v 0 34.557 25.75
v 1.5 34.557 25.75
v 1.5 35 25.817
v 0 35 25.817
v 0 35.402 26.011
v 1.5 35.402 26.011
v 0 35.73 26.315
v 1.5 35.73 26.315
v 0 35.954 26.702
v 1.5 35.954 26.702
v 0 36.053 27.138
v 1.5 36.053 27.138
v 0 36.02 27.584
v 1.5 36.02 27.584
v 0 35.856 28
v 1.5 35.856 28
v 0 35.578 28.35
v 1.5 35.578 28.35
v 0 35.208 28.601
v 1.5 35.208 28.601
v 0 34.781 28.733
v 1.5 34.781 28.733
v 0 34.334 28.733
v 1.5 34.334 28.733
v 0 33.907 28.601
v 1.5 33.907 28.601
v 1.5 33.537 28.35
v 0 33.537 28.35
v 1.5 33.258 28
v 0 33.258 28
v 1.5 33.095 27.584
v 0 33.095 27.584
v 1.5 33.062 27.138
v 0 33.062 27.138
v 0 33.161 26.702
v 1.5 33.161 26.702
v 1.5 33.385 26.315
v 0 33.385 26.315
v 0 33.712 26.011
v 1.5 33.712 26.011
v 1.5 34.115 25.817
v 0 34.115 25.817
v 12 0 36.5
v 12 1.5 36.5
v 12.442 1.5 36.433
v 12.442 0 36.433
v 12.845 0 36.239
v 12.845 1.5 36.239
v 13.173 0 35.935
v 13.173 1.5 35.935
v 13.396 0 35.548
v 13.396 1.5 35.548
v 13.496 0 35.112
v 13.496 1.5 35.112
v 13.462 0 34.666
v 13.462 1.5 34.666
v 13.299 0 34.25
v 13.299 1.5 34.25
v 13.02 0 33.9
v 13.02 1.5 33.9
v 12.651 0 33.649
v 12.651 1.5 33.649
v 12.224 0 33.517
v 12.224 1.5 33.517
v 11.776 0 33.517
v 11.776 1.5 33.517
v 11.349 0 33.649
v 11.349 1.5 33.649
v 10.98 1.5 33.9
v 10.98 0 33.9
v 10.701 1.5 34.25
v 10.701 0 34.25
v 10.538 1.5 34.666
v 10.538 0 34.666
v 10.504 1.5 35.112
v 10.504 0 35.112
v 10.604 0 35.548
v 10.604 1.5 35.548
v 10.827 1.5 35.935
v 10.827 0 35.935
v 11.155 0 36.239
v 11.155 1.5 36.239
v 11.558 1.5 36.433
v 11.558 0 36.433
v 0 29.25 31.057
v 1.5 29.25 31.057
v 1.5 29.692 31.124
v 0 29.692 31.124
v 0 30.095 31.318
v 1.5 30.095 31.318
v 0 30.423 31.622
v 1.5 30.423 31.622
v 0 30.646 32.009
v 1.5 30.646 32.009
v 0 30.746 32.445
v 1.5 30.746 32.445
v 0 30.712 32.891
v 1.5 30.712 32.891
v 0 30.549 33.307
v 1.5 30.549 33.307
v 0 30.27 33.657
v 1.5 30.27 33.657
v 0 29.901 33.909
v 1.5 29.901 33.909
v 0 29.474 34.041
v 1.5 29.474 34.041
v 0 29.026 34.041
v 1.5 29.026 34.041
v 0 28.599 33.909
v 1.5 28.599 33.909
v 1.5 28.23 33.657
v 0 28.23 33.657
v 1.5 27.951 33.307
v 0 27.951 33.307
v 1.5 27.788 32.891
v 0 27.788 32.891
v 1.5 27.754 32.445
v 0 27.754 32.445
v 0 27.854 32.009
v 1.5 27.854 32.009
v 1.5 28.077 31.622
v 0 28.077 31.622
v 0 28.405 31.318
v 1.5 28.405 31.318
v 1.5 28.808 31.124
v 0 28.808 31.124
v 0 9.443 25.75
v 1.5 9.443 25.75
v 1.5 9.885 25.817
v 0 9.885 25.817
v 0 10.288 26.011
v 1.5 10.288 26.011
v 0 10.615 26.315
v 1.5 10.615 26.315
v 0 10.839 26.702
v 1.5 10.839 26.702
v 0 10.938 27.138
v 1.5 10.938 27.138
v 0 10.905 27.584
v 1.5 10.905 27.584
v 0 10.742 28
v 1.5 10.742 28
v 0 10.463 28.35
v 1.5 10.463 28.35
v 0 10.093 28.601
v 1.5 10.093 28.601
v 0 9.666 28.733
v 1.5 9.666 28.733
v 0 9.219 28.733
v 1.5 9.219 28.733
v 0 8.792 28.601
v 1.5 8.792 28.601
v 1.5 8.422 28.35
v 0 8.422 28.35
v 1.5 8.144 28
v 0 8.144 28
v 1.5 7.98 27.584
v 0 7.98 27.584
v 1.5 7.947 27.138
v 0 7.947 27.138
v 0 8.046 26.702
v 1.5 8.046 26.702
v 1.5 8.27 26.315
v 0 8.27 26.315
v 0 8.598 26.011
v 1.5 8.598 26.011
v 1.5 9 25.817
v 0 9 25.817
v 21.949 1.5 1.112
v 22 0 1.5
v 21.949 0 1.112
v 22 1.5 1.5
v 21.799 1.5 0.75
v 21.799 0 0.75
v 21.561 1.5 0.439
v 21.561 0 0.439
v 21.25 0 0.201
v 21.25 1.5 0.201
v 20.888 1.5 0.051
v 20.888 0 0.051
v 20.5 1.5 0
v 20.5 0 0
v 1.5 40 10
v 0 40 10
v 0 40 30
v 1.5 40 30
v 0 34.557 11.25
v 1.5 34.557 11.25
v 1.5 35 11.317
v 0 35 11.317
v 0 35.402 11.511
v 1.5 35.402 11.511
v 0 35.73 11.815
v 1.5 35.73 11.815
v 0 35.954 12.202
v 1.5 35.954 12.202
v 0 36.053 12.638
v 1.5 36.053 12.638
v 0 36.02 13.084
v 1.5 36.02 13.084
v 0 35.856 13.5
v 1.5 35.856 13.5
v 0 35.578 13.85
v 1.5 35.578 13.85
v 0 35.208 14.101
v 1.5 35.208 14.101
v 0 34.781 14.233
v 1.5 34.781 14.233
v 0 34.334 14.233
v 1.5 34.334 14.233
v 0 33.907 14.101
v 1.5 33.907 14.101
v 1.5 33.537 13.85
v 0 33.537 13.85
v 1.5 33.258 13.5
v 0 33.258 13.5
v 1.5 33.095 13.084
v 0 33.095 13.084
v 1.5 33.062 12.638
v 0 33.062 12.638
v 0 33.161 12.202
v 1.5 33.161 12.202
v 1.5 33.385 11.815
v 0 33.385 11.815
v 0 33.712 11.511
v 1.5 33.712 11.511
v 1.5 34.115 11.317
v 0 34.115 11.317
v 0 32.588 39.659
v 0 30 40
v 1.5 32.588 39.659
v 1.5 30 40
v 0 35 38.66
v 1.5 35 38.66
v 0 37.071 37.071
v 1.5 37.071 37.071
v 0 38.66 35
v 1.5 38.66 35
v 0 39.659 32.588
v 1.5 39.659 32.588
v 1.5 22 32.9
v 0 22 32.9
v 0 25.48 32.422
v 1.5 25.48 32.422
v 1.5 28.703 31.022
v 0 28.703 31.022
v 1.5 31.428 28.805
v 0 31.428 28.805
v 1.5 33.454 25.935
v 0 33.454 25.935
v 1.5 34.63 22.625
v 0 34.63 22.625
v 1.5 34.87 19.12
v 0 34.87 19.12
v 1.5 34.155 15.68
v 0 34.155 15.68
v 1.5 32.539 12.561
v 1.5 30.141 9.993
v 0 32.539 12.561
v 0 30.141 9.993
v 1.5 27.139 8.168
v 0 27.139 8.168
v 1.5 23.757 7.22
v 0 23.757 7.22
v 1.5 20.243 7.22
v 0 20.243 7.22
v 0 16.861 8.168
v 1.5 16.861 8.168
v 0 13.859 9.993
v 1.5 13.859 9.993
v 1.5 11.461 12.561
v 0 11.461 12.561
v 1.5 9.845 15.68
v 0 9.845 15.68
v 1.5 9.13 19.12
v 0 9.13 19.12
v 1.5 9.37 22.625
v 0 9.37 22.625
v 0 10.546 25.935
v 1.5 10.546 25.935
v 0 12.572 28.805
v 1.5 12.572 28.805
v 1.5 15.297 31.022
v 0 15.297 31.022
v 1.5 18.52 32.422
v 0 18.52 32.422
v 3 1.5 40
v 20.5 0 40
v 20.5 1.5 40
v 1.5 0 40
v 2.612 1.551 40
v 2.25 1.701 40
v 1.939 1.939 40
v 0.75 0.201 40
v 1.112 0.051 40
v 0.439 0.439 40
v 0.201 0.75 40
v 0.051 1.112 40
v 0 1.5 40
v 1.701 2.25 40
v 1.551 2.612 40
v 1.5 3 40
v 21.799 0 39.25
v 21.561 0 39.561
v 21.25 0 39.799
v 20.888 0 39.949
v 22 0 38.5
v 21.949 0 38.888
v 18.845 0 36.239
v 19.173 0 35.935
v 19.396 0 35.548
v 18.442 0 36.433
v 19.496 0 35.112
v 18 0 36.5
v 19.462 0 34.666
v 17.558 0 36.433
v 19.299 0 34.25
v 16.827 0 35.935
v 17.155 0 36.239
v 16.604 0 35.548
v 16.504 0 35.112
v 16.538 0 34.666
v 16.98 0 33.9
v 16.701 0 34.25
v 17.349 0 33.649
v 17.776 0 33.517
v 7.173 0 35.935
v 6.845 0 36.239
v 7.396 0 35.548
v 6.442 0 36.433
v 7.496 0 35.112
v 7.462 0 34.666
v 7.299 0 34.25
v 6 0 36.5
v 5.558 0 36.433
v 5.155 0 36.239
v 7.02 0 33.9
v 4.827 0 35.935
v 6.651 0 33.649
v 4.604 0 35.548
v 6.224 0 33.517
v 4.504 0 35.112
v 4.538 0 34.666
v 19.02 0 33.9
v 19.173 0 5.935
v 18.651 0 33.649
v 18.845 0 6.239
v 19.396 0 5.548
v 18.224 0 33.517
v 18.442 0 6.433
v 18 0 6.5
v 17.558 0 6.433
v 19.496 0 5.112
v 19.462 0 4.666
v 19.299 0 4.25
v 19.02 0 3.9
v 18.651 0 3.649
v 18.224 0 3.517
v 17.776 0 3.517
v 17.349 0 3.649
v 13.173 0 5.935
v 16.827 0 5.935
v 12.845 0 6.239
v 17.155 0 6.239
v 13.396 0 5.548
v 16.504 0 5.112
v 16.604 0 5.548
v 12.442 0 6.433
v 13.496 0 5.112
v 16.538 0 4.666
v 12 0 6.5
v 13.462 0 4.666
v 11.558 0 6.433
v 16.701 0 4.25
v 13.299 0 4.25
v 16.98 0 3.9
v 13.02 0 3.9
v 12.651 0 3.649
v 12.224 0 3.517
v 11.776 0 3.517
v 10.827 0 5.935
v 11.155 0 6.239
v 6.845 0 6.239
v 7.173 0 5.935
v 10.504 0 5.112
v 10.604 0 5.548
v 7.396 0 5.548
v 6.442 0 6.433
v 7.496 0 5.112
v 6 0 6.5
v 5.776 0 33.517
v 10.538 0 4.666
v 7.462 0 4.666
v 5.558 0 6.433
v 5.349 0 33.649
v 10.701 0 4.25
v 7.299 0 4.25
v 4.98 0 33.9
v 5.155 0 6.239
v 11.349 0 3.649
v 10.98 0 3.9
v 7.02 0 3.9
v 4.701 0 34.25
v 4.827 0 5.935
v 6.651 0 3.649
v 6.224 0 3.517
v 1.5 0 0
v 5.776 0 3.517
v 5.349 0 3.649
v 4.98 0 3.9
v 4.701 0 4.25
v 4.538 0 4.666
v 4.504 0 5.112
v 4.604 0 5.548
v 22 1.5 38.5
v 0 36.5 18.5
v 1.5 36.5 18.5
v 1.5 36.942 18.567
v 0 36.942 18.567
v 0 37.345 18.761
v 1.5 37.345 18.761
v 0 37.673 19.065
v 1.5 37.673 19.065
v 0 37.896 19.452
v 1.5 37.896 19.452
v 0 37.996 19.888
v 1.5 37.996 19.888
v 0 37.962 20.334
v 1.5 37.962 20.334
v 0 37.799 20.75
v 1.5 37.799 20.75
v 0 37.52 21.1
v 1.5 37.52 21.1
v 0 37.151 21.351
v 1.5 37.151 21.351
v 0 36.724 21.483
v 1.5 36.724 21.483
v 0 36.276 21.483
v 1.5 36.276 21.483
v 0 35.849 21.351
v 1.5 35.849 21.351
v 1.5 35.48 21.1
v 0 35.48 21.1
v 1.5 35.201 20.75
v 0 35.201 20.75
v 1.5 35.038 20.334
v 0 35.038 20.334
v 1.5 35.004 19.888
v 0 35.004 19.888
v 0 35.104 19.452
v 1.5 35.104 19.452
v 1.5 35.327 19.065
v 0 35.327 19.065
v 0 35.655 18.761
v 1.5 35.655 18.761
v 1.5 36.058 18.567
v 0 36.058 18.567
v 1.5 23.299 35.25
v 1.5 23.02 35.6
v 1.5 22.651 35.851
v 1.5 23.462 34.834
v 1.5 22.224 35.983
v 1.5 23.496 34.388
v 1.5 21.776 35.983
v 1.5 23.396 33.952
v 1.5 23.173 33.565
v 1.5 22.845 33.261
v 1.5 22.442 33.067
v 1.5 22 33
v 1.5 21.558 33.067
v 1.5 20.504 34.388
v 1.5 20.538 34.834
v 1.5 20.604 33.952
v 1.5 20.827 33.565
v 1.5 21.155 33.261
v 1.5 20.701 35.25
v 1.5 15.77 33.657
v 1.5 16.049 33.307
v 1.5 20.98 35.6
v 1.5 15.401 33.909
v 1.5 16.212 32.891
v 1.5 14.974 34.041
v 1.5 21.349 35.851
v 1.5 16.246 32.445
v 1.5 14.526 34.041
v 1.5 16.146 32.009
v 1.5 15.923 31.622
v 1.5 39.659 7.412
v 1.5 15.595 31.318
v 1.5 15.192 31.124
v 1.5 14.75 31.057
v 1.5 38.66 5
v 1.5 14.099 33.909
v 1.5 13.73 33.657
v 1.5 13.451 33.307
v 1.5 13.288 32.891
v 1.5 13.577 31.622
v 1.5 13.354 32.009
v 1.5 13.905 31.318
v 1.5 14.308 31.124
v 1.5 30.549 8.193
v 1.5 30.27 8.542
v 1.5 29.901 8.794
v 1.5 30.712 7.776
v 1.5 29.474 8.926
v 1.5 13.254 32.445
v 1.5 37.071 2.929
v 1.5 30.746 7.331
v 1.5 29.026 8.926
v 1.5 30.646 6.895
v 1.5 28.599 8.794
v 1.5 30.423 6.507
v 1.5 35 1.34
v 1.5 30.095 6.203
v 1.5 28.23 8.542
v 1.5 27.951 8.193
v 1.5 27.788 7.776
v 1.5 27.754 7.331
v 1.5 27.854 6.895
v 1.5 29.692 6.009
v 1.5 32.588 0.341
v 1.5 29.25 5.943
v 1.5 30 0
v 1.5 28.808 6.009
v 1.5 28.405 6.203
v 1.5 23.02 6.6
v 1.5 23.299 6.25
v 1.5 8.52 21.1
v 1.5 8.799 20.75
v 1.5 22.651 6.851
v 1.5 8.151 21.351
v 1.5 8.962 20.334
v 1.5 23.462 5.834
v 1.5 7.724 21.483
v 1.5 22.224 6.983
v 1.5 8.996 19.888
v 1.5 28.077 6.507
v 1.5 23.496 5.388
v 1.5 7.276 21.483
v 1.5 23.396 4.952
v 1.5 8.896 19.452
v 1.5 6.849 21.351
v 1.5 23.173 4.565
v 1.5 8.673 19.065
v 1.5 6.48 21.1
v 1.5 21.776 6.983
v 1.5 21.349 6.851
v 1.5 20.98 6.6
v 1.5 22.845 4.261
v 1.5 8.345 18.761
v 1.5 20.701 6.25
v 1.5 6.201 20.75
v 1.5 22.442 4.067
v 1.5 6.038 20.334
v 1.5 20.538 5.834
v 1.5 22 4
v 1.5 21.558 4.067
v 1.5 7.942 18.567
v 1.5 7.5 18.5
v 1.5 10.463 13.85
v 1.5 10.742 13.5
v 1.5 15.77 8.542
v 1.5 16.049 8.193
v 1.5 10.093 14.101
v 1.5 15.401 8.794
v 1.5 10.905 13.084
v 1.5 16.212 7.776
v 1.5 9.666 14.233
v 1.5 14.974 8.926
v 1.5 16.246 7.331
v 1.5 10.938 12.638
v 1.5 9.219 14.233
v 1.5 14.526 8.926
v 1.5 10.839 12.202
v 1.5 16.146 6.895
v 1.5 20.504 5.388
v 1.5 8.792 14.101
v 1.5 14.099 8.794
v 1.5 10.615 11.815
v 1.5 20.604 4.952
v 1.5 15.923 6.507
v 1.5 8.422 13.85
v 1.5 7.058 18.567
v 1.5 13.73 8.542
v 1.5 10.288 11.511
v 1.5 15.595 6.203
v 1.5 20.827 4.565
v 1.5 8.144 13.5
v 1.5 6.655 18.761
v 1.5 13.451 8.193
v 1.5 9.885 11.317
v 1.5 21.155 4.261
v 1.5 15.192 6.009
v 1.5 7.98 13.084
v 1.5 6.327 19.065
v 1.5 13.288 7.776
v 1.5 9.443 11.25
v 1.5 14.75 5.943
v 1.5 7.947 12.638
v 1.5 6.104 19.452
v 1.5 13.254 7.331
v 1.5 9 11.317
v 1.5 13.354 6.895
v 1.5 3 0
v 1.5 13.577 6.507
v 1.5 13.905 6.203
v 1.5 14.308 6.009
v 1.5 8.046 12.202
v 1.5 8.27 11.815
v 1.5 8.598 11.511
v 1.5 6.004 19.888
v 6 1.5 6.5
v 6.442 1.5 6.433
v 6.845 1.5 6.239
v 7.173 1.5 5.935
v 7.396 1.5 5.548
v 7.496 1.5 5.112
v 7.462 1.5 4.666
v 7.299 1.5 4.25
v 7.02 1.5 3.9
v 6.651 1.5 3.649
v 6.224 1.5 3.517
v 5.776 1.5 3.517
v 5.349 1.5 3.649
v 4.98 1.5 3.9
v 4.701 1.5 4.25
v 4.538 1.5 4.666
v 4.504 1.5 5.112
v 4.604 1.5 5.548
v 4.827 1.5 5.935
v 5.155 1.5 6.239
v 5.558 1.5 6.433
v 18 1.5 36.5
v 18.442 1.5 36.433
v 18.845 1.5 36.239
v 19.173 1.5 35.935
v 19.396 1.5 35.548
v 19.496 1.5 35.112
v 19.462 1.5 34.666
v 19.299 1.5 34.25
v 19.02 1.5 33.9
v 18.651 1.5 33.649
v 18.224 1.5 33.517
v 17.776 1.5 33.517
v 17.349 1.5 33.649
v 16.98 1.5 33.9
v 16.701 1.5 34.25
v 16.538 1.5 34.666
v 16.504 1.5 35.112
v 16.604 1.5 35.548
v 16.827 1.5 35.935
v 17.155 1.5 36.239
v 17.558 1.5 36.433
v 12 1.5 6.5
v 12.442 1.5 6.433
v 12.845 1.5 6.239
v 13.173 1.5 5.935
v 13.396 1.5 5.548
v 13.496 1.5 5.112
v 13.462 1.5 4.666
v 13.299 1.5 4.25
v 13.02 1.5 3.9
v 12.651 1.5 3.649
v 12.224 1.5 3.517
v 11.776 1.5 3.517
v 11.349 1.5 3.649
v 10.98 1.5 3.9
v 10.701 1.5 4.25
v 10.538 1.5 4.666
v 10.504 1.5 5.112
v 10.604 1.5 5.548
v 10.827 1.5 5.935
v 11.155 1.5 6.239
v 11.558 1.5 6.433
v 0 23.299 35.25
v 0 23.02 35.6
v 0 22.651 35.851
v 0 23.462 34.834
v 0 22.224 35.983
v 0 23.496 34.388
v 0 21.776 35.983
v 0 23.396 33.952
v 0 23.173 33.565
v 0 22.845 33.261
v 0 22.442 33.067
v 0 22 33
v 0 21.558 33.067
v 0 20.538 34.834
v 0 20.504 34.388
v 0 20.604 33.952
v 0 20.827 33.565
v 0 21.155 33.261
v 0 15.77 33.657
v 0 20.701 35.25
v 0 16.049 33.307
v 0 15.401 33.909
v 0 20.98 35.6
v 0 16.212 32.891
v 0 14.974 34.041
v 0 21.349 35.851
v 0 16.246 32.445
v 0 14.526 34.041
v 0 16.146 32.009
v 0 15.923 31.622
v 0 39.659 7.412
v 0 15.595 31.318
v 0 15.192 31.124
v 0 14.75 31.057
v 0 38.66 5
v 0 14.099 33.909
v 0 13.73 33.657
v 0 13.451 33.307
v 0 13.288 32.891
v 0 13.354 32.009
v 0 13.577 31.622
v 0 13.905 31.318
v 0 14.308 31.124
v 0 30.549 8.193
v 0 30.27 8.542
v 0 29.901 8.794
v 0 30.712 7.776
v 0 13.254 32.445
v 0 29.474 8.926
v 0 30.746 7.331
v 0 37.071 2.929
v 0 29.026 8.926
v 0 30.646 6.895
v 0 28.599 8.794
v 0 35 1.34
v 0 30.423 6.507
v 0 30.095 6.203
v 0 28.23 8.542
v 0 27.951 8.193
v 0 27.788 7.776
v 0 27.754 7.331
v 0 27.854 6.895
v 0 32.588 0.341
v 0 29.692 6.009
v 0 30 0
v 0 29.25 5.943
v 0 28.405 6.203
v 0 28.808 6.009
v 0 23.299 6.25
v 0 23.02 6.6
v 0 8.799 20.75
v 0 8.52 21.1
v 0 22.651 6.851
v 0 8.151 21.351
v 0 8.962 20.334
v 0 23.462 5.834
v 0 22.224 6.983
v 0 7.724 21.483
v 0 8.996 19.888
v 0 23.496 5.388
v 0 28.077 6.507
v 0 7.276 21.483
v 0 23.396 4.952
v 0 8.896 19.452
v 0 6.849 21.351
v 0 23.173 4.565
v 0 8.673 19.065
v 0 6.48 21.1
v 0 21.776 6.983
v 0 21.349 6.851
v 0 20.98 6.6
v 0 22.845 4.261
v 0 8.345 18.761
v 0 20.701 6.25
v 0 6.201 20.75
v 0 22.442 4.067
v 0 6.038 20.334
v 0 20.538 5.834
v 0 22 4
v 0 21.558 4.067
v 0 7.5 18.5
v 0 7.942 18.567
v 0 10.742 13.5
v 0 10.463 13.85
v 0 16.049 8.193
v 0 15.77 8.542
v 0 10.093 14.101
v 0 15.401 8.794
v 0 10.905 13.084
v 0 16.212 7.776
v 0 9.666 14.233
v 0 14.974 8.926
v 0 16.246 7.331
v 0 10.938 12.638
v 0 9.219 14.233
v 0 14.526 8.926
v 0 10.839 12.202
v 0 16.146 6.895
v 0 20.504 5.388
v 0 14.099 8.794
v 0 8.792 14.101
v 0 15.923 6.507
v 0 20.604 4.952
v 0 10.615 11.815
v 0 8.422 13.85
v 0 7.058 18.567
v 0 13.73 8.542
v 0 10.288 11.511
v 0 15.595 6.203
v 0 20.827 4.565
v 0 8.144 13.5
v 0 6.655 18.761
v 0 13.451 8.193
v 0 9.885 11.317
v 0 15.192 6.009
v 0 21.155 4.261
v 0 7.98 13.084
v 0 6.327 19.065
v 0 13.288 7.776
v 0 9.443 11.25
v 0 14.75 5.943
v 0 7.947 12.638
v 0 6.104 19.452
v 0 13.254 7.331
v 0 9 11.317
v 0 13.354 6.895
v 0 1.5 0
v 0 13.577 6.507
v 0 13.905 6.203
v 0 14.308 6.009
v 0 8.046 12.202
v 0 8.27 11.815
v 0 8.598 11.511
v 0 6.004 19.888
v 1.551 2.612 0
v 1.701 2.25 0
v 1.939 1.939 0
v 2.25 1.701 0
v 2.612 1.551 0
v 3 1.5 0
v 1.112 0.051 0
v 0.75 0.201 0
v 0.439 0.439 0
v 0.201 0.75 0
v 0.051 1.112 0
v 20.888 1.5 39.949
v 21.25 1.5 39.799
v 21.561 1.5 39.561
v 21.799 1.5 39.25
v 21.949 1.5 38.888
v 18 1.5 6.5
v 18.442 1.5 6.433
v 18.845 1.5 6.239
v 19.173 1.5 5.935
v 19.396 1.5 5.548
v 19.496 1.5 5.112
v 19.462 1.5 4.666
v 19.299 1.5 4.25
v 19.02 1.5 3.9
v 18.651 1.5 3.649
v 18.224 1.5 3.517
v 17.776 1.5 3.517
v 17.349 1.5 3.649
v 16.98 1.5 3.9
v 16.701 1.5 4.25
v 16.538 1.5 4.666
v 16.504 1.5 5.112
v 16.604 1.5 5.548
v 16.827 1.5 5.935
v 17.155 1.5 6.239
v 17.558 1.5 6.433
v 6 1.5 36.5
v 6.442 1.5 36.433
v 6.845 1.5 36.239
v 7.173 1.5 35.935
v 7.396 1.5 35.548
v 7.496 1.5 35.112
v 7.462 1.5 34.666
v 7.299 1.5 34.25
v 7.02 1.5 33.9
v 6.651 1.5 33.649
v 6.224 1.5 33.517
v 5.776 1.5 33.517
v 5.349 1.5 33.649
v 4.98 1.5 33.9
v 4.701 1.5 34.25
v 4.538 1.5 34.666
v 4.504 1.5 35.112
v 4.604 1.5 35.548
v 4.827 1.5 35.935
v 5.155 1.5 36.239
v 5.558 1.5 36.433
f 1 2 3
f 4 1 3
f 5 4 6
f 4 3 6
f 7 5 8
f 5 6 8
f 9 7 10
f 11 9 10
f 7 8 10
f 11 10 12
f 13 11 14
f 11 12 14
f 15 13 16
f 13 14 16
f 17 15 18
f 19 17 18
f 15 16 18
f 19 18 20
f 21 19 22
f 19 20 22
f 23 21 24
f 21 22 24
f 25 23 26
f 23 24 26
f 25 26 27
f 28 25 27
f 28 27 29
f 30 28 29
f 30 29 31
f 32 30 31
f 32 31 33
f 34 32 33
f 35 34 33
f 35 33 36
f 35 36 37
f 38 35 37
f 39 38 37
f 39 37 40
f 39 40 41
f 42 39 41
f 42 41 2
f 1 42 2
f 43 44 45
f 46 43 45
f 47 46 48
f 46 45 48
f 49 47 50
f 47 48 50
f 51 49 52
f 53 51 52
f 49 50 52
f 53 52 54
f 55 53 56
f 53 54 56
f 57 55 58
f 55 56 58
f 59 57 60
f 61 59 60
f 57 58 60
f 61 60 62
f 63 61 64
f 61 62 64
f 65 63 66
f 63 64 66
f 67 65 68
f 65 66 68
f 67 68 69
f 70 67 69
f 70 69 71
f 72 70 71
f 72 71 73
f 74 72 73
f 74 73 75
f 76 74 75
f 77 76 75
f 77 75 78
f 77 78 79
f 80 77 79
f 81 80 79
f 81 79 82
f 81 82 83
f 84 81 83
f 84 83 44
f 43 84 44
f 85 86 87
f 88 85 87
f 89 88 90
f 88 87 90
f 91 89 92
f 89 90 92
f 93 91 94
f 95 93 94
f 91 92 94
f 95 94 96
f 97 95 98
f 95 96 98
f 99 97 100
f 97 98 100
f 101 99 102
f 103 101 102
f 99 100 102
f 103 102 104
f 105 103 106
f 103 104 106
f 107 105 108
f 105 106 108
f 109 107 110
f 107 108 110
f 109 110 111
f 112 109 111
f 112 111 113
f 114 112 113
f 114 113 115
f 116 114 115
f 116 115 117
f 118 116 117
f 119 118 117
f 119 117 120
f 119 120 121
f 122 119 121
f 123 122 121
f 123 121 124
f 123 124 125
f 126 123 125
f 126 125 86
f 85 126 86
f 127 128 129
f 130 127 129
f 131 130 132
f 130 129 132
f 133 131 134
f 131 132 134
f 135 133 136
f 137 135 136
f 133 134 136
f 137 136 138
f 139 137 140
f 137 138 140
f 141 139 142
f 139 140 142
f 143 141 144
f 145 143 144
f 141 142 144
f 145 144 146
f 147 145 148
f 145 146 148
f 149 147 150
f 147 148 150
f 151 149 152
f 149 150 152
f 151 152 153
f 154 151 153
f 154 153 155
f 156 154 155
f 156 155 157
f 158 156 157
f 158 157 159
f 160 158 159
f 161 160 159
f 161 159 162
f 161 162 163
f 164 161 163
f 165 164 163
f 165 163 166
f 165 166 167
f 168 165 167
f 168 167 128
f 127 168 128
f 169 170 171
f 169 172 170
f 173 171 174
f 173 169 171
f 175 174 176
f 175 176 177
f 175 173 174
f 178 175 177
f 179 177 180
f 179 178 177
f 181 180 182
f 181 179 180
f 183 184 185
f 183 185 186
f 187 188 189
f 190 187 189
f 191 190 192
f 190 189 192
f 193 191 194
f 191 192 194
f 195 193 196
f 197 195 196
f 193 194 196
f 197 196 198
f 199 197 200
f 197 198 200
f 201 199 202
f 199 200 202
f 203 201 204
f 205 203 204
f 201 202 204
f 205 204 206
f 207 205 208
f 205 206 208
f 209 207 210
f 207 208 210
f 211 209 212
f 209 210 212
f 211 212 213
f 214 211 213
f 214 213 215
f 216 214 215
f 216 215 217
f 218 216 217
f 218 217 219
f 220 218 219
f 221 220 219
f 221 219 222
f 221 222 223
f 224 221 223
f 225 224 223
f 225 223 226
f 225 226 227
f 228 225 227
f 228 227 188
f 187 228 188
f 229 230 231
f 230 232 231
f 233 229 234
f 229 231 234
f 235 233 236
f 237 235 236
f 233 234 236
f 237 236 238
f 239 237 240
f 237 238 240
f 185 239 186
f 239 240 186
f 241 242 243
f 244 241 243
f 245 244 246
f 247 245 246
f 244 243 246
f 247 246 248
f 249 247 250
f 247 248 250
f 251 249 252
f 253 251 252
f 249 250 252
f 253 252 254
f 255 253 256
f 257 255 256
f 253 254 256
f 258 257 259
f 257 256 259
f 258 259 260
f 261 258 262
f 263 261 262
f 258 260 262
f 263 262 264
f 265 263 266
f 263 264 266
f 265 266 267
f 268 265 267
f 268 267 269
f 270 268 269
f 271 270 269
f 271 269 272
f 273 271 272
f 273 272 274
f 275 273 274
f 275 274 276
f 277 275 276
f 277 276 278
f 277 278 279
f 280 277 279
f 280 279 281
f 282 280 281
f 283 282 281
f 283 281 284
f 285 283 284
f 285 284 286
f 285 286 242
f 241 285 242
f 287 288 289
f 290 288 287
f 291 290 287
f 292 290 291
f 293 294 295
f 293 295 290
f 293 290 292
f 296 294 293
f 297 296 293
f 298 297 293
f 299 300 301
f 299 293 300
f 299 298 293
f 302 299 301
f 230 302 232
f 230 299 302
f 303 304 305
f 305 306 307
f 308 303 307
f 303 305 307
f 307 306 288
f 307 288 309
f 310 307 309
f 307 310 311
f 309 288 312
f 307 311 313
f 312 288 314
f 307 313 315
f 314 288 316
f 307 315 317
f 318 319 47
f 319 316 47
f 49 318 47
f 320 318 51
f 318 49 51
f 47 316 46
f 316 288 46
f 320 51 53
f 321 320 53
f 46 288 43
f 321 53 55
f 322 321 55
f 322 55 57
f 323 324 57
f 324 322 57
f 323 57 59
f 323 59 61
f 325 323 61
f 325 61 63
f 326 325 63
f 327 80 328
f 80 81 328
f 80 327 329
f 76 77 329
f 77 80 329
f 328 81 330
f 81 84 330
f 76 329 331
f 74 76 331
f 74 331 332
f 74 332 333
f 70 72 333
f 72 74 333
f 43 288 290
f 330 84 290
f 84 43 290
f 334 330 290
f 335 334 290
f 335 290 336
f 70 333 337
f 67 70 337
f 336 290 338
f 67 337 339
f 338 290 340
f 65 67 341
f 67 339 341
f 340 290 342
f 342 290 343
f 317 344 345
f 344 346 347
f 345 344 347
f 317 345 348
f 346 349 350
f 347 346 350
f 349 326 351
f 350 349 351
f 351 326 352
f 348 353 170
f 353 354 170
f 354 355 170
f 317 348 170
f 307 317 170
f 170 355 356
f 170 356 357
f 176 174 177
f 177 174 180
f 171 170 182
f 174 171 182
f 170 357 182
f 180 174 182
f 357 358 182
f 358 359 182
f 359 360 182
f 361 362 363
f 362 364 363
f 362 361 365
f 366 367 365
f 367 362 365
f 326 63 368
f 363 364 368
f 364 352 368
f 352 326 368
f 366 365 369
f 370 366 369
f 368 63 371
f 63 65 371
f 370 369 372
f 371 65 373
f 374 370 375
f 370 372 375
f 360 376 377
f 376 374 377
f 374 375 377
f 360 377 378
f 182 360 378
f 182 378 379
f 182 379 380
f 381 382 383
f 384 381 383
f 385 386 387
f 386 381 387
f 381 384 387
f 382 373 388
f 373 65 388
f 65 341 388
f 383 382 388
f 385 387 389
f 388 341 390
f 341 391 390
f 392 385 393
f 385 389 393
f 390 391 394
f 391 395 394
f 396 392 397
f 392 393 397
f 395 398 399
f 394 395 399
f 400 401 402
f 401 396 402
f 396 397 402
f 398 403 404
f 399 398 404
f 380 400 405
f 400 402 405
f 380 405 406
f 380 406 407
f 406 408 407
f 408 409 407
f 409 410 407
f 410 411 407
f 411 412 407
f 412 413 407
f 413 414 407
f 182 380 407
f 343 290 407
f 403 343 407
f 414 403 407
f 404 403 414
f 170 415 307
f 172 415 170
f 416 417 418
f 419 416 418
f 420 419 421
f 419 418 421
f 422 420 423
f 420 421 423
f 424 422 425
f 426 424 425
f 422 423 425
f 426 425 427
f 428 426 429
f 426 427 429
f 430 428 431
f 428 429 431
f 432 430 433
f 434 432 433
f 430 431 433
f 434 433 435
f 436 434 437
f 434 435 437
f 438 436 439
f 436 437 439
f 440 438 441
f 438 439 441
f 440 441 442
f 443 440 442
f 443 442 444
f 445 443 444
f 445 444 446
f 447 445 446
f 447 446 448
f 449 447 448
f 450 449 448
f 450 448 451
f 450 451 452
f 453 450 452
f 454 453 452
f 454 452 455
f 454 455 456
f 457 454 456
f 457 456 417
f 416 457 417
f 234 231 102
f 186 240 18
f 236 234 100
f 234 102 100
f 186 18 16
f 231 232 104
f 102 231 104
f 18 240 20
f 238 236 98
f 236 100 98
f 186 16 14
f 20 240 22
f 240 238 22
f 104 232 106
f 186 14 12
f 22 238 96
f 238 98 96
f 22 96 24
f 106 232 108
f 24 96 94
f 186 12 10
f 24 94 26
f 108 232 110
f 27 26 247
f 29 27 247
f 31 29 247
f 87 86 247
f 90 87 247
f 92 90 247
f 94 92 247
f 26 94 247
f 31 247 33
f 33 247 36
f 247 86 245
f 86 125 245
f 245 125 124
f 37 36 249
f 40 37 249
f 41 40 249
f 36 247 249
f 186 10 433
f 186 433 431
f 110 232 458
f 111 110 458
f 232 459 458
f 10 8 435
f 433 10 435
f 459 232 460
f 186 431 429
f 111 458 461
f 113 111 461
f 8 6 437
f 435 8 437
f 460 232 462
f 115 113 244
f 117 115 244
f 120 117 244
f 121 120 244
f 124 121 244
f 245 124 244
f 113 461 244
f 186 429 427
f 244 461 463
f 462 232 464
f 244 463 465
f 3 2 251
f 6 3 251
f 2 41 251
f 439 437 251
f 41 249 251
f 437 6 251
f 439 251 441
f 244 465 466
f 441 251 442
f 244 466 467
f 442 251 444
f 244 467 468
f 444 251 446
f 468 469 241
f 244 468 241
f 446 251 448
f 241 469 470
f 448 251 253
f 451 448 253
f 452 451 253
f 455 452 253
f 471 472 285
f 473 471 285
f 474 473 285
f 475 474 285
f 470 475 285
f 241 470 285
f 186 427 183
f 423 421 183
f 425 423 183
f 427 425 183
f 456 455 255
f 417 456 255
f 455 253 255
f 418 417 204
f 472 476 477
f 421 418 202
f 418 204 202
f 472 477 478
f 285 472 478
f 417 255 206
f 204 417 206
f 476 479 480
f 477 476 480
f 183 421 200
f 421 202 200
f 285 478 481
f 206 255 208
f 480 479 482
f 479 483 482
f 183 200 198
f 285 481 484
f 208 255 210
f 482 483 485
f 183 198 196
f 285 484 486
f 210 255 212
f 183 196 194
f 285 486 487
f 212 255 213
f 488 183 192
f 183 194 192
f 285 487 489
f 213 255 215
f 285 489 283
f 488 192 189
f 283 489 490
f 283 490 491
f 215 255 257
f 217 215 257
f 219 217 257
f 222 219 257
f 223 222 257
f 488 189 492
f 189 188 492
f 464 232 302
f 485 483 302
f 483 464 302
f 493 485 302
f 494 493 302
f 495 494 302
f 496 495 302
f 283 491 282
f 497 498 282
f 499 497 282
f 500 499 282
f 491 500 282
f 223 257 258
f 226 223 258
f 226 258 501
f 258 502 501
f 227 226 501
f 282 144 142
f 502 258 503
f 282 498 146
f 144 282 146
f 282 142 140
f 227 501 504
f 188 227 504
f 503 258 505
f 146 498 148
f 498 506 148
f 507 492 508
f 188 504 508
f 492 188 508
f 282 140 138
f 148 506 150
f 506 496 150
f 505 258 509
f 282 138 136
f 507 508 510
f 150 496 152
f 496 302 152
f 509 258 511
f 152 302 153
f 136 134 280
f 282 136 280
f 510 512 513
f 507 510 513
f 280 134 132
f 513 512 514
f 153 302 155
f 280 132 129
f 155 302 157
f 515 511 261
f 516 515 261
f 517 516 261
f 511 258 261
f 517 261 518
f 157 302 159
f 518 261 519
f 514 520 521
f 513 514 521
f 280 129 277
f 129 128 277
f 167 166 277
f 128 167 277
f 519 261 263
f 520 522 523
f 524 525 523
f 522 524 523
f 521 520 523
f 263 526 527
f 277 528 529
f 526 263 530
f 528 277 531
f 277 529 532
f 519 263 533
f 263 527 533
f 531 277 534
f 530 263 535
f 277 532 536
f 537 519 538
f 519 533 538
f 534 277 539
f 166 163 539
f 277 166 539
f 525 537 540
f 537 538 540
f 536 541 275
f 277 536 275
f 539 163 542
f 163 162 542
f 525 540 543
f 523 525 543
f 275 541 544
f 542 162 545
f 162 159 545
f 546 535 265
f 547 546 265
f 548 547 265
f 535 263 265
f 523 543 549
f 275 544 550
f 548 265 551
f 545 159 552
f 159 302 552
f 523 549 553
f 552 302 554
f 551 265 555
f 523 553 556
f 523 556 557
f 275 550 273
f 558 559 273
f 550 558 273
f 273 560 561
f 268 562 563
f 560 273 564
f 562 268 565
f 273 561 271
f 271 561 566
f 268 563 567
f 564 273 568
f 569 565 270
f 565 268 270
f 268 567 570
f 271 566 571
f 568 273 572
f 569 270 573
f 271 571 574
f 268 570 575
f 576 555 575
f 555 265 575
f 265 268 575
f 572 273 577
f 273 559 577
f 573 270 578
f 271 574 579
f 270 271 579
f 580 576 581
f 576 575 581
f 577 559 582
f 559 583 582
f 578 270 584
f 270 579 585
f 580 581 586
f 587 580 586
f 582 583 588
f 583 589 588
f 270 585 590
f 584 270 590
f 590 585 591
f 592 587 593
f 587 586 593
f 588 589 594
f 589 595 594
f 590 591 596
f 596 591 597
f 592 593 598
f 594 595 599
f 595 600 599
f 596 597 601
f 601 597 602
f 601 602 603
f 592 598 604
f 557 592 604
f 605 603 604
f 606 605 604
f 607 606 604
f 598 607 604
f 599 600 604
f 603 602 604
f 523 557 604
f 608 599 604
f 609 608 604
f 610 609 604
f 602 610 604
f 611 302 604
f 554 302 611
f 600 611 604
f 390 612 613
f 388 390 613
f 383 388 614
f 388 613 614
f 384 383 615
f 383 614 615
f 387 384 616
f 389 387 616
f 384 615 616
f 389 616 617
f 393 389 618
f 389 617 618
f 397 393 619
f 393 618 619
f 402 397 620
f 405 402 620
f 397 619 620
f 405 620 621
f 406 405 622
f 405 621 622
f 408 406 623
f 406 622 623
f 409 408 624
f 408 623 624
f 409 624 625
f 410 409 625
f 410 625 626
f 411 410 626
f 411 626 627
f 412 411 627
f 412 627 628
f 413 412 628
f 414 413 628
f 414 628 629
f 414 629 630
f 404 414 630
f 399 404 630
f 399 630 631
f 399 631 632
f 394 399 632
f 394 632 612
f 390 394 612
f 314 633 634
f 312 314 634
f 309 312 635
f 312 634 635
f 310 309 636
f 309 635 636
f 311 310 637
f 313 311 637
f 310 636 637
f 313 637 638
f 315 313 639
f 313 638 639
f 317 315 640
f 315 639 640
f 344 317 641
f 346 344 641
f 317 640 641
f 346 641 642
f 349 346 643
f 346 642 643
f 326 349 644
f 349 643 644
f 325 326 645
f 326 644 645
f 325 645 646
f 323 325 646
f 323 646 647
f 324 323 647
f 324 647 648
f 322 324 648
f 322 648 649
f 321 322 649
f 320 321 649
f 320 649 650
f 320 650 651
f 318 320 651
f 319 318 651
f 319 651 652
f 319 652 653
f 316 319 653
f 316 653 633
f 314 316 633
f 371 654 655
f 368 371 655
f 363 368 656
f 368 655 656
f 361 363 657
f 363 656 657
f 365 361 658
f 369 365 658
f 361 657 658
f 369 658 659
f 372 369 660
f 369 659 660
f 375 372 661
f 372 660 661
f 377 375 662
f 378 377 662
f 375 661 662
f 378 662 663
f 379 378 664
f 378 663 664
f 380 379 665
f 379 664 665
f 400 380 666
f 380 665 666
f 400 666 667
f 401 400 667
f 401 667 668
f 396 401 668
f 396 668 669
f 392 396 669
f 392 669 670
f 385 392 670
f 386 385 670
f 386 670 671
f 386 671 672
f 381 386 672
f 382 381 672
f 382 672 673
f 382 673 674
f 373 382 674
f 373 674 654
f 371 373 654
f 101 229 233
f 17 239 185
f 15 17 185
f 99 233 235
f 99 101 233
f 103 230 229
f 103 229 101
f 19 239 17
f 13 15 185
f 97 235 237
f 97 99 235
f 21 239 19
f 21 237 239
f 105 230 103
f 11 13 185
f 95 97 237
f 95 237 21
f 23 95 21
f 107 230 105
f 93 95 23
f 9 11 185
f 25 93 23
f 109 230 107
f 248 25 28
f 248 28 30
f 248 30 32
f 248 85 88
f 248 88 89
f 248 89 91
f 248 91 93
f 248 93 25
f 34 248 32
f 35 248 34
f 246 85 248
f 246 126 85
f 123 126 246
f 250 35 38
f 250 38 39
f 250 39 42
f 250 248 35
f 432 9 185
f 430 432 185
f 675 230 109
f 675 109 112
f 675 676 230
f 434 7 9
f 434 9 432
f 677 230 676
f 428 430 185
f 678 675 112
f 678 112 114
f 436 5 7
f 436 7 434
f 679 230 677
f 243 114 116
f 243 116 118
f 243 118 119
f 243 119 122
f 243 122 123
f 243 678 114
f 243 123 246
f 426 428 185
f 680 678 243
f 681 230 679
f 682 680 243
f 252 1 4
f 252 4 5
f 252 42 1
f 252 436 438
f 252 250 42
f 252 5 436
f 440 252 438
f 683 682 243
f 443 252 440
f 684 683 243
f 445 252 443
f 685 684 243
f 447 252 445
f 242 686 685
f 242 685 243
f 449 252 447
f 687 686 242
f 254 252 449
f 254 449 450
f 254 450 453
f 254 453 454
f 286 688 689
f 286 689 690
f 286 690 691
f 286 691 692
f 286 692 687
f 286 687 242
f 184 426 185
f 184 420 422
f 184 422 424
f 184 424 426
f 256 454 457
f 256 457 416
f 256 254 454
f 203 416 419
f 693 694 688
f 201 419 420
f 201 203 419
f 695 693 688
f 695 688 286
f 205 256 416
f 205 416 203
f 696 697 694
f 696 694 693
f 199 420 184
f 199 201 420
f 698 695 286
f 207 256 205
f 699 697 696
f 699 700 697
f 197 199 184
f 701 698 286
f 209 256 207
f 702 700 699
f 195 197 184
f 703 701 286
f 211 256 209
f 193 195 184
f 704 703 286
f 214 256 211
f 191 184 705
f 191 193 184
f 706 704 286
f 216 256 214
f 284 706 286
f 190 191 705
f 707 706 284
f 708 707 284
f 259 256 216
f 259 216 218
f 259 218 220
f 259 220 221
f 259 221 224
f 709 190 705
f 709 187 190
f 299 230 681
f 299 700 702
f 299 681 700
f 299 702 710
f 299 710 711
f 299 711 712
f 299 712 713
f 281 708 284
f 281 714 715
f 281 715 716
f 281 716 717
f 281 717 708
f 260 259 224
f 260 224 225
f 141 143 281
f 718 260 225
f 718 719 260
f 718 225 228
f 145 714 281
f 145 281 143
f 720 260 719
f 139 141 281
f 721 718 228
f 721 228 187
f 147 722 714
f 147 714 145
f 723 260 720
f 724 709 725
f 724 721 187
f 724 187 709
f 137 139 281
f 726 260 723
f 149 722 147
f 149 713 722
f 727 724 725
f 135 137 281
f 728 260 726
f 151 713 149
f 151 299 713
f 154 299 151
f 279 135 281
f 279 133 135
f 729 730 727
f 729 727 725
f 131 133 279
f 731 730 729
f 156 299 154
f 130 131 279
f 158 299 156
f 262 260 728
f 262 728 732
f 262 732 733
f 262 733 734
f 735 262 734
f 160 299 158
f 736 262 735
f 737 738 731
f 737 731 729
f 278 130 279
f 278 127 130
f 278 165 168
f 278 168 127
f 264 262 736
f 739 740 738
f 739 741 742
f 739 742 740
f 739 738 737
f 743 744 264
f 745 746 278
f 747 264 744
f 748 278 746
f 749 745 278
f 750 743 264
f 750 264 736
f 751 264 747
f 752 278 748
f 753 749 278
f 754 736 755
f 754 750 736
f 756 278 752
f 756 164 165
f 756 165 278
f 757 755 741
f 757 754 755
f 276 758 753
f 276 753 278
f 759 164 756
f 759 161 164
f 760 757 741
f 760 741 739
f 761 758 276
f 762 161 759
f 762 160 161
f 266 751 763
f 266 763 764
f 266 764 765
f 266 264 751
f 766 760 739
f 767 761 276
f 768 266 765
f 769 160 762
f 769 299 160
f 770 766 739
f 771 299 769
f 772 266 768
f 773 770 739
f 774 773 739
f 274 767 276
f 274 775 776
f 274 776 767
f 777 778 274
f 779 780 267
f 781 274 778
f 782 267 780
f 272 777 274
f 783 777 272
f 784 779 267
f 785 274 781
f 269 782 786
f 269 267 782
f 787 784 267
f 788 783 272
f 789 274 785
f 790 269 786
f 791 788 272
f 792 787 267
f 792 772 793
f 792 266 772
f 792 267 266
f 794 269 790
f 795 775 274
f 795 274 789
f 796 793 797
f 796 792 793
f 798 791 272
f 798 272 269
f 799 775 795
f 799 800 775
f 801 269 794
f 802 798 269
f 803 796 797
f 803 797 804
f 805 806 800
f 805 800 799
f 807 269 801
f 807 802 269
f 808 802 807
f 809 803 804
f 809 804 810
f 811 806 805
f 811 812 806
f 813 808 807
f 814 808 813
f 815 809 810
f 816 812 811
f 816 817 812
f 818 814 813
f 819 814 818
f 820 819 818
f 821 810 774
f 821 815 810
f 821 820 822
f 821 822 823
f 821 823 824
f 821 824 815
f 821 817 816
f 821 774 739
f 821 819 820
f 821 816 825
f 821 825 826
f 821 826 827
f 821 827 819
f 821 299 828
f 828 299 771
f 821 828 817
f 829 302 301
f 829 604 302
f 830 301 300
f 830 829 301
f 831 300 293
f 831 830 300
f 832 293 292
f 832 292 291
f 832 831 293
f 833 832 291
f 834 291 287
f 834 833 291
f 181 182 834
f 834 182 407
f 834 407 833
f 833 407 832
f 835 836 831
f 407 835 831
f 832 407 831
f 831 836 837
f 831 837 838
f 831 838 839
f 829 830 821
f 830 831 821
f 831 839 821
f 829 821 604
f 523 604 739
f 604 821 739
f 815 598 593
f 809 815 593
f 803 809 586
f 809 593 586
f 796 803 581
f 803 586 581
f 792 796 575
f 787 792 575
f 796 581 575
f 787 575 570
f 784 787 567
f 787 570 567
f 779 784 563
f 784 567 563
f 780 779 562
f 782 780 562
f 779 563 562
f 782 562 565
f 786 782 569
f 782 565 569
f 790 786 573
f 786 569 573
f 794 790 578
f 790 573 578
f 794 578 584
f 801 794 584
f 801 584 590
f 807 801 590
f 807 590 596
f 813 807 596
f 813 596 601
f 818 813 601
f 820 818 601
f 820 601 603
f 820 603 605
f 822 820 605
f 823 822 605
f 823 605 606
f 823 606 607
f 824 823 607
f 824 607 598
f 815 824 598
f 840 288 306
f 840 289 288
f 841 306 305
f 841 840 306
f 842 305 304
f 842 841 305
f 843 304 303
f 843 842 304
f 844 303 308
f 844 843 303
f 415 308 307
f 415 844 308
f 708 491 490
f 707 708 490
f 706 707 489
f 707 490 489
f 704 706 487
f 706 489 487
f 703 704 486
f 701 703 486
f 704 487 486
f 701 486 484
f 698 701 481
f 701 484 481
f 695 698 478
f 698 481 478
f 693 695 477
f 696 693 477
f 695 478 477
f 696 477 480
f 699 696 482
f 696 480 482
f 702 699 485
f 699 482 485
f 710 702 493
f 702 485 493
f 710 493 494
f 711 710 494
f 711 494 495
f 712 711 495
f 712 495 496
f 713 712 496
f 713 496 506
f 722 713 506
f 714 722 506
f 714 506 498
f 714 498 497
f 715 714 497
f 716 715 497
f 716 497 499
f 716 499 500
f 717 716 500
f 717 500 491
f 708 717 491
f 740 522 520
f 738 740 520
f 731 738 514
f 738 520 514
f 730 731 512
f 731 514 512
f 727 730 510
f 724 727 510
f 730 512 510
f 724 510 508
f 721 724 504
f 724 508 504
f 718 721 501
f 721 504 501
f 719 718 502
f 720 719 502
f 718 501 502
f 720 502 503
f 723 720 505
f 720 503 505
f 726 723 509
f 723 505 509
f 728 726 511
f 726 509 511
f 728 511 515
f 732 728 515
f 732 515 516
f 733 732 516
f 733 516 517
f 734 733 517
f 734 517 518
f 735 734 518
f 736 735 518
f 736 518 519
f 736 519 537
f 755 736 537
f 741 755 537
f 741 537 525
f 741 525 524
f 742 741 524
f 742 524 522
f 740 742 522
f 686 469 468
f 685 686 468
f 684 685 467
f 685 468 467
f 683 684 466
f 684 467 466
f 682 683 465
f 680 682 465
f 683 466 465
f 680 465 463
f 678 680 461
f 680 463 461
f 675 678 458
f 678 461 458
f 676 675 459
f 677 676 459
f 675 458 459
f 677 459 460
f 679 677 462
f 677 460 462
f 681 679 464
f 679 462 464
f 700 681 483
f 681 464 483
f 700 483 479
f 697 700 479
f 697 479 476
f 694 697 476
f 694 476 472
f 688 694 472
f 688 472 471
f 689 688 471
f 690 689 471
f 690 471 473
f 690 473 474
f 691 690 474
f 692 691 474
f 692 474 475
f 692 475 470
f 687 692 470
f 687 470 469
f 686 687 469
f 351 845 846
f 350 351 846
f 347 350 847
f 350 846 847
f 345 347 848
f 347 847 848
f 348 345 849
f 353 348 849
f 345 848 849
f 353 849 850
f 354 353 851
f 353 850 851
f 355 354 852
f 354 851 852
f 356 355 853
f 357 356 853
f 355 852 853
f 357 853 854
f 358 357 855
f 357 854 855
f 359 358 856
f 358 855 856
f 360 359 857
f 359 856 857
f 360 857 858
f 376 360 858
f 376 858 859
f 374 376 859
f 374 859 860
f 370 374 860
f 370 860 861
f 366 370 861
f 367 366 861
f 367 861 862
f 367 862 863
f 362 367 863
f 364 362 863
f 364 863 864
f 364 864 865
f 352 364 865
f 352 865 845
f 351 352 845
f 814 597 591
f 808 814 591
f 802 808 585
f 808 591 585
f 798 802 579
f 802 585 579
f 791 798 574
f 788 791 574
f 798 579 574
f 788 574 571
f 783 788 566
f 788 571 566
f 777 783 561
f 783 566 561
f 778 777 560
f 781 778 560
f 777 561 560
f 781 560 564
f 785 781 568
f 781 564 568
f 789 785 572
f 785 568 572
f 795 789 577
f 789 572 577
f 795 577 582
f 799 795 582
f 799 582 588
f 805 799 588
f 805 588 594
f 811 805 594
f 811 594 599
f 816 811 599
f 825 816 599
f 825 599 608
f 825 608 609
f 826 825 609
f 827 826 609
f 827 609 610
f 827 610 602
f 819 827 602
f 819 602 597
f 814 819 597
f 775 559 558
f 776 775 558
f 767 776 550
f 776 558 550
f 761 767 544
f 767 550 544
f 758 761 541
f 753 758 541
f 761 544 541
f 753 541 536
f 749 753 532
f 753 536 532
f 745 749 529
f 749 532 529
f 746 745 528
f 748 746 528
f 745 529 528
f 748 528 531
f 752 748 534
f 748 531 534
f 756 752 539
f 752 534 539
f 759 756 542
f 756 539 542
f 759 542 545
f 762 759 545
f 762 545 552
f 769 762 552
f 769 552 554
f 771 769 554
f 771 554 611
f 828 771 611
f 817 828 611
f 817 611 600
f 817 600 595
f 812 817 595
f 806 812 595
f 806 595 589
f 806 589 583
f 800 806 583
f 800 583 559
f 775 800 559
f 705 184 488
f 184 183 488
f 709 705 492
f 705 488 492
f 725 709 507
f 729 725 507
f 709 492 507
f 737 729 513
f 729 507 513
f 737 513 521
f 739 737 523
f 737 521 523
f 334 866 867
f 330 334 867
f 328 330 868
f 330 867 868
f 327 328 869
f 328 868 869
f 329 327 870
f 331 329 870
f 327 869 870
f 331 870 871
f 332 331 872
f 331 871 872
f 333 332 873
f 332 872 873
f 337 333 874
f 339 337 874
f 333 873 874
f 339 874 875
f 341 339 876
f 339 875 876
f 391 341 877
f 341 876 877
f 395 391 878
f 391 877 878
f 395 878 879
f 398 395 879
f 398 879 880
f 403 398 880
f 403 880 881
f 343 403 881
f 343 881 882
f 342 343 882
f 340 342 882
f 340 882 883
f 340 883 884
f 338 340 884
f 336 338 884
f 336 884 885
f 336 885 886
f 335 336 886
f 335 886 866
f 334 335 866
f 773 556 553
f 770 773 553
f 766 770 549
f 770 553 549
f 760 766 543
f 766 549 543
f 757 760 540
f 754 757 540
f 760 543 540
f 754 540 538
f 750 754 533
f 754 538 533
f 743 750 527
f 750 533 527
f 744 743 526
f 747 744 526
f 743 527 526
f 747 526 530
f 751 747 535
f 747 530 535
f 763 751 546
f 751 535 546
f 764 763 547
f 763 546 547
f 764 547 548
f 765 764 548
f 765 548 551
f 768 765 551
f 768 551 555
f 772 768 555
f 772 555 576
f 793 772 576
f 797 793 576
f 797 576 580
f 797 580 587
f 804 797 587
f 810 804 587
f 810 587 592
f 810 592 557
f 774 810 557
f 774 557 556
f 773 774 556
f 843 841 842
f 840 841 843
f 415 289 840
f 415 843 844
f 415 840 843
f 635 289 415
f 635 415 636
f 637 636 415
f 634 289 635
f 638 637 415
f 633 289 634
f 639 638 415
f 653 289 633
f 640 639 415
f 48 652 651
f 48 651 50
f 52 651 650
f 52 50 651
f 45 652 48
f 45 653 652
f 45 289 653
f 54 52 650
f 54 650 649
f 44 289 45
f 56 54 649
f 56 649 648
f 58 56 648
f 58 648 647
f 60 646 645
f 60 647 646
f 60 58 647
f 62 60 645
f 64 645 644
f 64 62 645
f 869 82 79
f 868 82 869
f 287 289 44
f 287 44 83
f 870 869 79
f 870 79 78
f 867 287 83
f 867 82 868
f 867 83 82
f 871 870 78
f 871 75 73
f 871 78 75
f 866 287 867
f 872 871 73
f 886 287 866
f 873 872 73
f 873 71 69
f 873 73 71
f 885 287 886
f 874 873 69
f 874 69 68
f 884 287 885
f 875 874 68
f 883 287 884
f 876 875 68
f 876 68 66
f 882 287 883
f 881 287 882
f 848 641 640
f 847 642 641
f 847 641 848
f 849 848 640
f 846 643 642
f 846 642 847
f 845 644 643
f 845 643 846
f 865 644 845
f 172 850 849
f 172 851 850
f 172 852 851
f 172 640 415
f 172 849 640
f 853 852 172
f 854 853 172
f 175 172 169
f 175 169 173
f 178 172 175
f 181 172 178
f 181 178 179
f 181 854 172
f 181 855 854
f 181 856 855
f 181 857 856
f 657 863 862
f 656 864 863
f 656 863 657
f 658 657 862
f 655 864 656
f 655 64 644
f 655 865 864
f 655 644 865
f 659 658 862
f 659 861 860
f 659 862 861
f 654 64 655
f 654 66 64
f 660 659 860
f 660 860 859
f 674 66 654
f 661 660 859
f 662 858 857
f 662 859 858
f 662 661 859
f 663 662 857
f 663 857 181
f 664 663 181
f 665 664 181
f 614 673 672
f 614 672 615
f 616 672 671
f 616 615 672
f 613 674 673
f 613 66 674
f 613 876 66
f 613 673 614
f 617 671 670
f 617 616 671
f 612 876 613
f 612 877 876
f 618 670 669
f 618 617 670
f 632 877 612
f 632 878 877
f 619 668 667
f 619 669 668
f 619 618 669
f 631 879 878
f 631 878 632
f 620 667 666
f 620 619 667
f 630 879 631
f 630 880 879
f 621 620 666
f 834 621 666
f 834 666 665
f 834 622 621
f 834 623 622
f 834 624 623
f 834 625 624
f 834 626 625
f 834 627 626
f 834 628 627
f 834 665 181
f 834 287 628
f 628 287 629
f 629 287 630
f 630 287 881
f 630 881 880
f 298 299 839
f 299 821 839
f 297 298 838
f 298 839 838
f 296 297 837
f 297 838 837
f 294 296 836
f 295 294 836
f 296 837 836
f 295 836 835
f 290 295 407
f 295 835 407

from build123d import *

# Parameters (mm, degrees)
SKETCH1_W           = 1.5
SKETCH1_H           = 40
BOSS_EXTRUDE1_DEPTH = 40
SKETCH2_W           = 40
SKETCH2_H           = 1.5
BOSS_EXTRUDE2_DEPTH = 20.5
SKETCH3_R           = 1.5
CUT_EXTRUDE1_DEPTH  = 20.5
FILLET5_R           = 1.5
FILLET6_R           = 1.5
FILLET7_R           = 10
FILLET8_R           = 10
FILLET9_R           = 1.5
FILLET10_R          = 1.5
SKETCH6_R           = 1.5
CUT_EXTRUDE2_DEPTH  = 4
SKETCH7_R           = 12.9
CUT_EXTRUDE5_DEPTH  = 4


with BuildPart() as part:
    # Sketch1 → Boss-Extrude1 (new body)
    with BuildSketch(Plane(origin=(0, 0, 0), x_dir=(1, 0, 0), z_dir=(0, 1, 0))):
        with Locations((0.75, -20)):
            Rectangle(SKETCH1_W, SKETCH1_H)
    extrude(amount=BOSS_EXTRUDE1_DEPTH)

    # Sketch2 → Boss-Extrude2 (add)
    with BuildSketch(Plane(origin=(1.5, 0, 0), x_dir=(0, 0, -1), z_dir=(1, 0, 0))):
        with Locations((-20, 0.75)):
            Rectangle(SKETCH2_W, SKETCH2_H)
    extrude(amount=BOSS_EXTRUDE2_DEPTH)

    # Sketch3 → Cut-Extrude1 (cut)
    with BuildSketch(Plane(origin=(0, 1.5, 0), x_dir=(1, 0, 0), z_dir=(0, 1, 0))):
        with Locations(Location((6, -5, 0), (0, 0, 270))):
            Circle(SKETCH3_R)
        with Locations(Location((6, -35, 0), (0, 0, 270))):
            Circle(SKETCH3_R)
        with Locations(Location((12, -35, 0), (0, 0, 270))):
            Circle(SKETCH3_R)
        with Locations(Location((12, -5, 0), (0, 0, 270))):
            Circle(SKETCH3_R)
        with Locations(Location((18, -5, 0), (0, 0, 270))):
            Circle(SKETCH3_R)
        with Locations(Location((18, -35, 0), (0, 0, 270))):
            Circle(SKETCH3_R)
    extrude(amount=-CUT_EXTRUDE1_DEPTH, mode=Mode.SUBTRACT)

    # Fillet5
    fillet5_edges = [part.edges().sort_by_distance(p)[0] for p in [
        (0, 0, 20),
    ]]
    fillet(fillet5_edges, radius=FILLET5_R)

    # Fillet6
    fillet6_edges = [part.edges().sort_by_distance(p)[0] for p in [
        (1.5, 1.5, 20),
    ]]
    fillet(fillet6_edges, radius=FILLET6_R)

    # Fillet7
    fillet7_edges = [part.edges().sort_by_distance(p)[0] for p in [
        (0.75, 40, 40),
    ]]
    fillet(fillet7_edges, radius=FILLET7_R)

    # Fillet8
    fillet8_edges = [part.edges().sort_by_distance(p)[0] for p in [
        (0.75, 40, 0),
    ]]
    fillet(fillet8_edges, radius=FILLET8_R)

    # Fillet9
    fillet9_edges = [part.edges().sort_by_distance(p)[0] for p in [
        (22, 0.75, 40),
    ]]
    fillet(fillet9_edges, radius=FILLET9_R)

    # Fillet10
    fillet10_edges = [part.edges().sort_by_distance(p)[0] for p in [
        (22, 0.75, 0),
    ]]
    fillet(fillet10_edges, radius=FILLET10_R)

    # Sketch6 → Cut-Extrude2 (cut)
    with BuildSketch(Plane(origin=(1.5, 0, 0), x_dir=(0, 0, -1), z_dir=(1, 0, 0))):
        with Locations((-20, 36.5)):
            Circle(SKETCH6_R)
        with Locations((-12.75, 34.557368355)):
            Circle(SKETCH6_R)
        with Locations((-7.442631645, 29.25)):
            Circle(SKETCH6_R)
        with Locations((-5.5, 22)):
            Circle(SKETCH6_R)
        with Locations((-7.442631645, 14.75)):
            Circle(SKETCH6_R)
        with Locations((-12.75, 9.442631645)):
            Circle(SKETCH6_R)
        with Locations((-20, 7.5)):
            Circle(SKETCH6_R)
        with Locations((-27.25, 9.442631645)):
            Circle(SKETCH6_R)
        with Locations((-32.557368355, 14.75)):
            Circle(SKETCH6_R)
        with Locations((-34.5, 22)):
            Circle(SKETCH6_R)
        with Locations((-32.557368355, 29.25)):
            Circle(SKETCH6_R)
        with Locations((-27.25, 34.557368355)):
            Circle(SKETCH6_R)
    extrude(amount=-CUT_EXTRUDE2_DEPTH, mode=Mode.SUBTRACT)

    # Sketch7 → Cut-Extrude5 (cut)
    with BuildSketch(Plane.ZY):
        with Locations((20, 22)):
            Circle(SKETCH7_R)
    extrude(amount=-CUT_EXTRUDE5_DEPTH, mode=Mode.SUBTRACT)


solid = part.part
